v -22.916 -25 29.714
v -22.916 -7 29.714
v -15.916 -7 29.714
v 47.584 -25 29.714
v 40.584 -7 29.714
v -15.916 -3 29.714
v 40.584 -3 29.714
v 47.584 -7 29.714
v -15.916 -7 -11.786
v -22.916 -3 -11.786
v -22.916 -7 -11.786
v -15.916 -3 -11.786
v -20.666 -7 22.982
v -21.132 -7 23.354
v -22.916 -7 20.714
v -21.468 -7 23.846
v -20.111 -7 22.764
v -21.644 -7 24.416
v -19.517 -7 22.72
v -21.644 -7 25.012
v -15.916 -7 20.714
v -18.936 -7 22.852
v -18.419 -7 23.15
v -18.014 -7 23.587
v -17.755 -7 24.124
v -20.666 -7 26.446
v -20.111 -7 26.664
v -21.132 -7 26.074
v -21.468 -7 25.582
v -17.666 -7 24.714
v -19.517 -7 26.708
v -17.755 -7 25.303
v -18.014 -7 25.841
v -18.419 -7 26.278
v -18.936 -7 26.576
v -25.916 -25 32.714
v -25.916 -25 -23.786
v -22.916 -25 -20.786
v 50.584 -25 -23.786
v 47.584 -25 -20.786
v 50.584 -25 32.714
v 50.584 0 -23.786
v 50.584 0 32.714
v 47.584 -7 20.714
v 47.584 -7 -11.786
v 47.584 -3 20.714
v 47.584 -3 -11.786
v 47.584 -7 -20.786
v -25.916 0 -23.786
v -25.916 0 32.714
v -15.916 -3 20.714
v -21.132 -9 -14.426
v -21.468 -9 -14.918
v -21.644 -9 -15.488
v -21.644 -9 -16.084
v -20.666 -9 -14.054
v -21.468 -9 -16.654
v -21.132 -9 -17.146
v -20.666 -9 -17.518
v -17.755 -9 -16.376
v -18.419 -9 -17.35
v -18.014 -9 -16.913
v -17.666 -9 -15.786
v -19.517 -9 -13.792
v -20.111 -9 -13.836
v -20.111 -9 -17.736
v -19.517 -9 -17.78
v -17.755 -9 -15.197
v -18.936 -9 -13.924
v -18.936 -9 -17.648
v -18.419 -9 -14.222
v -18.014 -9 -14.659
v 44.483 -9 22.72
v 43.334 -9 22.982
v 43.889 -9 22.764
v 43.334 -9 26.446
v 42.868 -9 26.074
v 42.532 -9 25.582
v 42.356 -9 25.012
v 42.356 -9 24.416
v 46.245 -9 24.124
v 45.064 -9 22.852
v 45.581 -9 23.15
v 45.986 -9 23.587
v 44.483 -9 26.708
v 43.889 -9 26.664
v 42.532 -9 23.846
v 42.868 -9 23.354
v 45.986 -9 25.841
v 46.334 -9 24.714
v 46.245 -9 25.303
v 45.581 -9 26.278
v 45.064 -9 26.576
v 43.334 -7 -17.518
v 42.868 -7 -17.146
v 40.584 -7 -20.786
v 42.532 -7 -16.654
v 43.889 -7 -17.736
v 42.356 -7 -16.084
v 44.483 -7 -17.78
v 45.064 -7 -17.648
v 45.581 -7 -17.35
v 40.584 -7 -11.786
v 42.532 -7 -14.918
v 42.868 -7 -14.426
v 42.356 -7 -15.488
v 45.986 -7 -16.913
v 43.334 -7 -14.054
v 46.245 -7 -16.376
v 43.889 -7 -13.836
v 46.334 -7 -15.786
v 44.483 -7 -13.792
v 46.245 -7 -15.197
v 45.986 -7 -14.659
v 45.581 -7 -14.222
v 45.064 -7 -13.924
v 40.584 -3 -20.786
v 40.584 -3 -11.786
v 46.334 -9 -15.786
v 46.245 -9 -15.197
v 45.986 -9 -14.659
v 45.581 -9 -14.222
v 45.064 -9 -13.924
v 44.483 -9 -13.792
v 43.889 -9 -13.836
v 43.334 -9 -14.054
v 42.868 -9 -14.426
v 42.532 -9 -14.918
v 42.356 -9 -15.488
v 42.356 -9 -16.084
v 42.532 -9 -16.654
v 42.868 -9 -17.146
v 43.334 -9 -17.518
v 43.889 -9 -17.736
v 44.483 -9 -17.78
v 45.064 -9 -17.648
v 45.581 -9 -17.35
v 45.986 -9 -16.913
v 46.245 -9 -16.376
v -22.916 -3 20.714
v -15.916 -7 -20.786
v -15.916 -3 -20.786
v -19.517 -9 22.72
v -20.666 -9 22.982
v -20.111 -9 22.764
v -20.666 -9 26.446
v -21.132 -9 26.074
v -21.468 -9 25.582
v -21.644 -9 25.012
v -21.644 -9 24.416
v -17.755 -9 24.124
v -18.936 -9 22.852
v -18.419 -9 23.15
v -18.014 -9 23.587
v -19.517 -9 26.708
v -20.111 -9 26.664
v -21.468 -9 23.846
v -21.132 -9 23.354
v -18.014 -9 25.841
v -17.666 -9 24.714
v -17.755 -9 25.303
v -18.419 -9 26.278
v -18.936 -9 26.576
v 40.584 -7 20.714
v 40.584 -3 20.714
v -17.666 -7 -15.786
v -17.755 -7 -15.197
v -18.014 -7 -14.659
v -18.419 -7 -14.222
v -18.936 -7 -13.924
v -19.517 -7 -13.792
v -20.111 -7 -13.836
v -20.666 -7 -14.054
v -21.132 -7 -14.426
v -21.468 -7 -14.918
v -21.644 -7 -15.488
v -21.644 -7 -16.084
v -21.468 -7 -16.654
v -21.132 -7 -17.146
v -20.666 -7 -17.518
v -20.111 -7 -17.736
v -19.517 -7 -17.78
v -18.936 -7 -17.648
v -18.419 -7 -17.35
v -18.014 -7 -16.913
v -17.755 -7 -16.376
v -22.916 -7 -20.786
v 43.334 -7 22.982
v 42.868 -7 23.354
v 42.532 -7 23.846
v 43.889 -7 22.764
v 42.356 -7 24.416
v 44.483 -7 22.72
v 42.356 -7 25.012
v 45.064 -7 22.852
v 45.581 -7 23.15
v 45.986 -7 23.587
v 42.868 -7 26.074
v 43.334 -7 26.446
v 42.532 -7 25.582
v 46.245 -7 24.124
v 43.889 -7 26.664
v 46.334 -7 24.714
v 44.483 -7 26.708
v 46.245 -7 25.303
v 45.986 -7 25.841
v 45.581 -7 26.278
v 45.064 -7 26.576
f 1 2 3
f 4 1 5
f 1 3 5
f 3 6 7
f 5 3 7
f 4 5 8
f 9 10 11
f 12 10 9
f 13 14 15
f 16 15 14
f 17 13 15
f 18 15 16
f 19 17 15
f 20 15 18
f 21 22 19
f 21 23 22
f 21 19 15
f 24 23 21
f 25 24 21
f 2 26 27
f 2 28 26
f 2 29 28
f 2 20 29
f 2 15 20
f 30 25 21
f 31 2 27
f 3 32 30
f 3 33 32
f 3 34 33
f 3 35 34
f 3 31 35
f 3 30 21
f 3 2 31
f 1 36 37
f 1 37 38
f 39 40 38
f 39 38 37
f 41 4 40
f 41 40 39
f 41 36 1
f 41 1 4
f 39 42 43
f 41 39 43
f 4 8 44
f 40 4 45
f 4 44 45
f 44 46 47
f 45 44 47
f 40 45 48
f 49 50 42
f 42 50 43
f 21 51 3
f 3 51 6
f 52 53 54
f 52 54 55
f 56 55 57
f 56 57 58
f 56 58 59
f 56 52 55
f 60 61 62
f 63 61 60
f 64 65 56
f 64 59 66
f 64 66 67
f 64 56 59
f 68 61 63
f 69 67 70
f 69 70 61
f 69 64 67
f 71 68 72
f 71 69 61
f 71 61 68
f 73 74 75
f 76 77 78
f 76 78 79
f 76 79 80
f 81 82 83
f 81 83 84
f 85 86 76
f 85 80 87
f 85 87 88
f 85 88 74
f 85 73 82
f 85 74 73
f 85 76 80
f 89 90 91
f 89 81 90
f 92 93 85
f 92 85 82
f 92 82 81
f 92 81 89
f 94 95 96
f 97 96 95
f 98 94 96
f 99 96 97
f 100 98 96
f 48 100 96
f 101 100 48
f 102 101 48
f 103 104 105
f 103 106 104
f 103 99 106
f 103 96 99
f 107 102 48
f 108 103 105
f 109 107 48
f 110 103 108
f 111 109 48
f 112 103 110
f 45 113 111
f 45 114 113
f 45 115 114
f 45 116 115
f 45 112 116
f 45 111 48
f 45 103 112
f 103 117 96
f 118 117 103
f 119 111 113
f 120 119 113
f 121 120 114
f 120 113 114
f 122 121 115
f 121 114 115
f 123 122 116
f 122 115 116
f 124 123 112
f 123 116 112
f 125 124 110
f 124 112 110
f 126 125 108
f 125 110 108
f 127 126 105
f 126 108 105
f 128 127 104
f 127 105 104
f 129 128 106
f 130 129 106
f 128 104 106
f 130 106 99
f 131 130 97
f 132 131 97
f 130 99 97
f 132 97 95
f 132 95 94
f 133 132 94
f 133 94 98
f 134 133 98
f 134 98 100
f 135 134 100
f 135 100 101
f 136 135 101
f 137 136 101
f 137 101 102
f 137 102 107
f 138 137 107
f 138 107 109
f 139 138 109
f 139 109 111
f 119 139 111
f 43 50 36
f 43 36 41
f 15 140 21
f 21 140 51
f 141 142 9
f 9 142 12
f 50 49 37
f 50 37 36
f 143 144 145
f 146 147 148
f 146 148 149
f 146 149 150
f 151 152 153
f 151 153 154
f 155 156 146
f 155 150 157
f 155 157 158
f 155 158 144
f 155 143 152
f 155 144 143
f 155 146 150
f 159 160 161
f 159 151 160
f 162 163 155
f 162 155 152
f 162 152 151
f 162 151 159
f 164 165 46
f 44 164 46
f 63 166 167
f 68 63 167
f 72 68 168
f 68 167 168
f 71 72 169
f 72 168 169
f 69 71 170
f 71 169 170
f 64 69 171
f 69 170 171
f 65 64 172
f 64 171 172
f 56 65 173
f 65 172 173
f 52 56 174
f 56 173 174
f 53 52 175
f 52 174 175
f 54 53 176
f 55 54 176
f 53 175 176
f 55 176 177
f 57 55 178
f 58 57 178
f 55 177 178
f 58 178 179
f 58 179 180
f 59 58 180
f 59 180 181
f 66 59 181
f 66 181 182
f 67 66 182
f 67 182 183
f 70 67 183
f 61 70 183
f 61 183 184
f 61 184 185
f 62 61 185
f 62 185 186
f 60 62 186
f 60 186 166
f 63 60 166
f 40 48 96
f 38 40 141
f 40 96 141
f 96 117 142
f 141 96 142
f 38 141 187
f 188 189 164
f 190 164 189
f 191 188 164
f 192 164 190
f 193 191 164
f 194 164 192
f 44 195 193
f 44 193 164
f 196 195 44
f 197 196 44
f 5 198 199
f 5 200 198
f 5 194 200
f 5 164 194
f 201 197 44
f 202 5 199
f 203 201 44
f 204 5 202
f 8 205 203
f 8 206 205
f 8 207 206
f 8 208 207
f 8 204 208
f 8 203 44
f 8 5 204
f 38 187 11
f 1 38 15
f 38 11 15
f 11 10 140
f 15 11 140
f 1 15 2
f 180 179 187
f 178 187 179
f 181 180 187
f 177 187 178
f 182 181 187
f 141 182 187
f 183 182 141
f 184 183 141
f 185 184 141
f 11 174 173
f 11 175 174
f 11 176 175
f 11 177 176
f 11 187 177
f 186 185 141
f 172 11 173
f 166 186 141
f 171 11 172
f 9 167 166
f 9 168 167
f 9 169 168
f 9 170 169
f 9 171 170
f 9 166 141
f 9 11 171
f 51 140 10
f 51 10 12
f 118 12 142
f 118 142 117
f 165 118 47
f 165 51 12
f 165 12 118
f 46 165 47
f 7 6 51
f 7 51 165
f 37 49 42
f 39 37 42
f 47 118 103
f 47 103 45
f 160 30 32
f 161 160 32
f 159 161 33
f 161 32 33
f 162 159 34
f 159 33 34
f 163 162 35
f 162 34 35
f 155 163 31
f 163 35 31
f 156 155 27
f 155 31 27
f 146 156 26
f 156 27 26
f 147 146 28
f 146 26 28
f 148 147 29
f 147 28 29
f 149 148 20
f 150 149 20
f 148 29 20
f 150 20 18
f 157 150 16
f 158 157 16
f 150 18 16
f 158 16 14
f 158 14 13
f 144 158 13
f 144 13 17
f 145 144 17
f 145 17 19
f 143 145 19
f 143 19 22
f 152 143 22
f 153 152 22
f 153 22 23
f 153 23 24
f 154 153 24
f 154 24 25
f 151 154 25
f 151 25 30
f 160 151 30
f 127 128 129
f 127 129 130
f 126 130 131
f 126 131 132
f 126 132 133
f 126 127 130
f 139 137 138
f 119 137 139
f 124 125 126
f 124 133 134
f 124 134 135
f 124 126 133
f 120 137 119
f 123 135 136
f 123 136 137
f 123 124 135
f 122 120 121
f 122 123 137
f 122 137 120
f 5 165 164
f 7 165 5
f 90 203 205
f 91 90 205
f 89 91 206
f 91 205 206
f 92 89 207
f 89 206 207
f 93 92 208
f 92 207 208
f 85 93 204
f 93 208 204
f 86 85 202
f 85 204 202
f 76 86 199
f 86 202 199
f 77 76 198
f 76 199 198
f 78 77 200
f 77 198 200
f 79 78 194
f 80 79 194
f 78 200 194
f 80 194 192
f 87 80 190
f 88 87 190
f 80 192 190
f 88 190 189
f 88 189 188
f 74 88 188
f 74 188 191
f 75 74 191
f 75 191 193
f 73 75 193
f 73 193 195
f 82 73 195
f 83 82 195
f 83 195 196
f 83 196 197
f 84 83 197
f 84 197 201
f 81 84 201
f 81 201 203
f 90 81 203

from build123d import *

# Parameters (mm, degrees)
F0_W     = 76.5
F0_H     = 56.5
F1_DEPTH = 25
F2_DEPTH = 3
F0_W_2   = 7
F0_H_2   = 9
F0_R     = 2
F3_DEPTH = 7
F4_DEPTH = 9
F5_DEPTH = 9
F6_DEPTH = 9


with BuildPart() as f1:
    # F0 (on Front) → F1 (new body)
    with BuildSketch(Plane.XZ):
        with Locations((12.333626, 4.463955)):
            Rectangle(F0_W, F0_H)
        Polygon((-22.916374, 20.713955), (-22.916374, 29.713955), (-15.916374, 29.713955), (12.333626, 29.713955), (40.583626, 29.713955), (47.583626, 29.713955), (47.583626, 20.713955), (47.583626, 4.463955), (47.583626, -11.786045), (47.583626, -20.786045), (40.583626, -20.786045), (12.333626, -20.786045), (-15.916374, -20.786045), (-22.916374, -20.786045), (-22.916374, -11.786045), (-22.916374, 4.463955), align=None, mode=Mode.SUBTRACT)
    extrude(amount=F1_DEPTH)

    # F0 (on Front) → F2 (join)
    with BuildSketch(Plane.XZ):
        Polygon((12.333626, 29.713955), (-15.916374, 29.713955), (-15.916374, 20.713955), (-22.916374, 20.713955), (-22.916374, 4.463955), (12.333626, 4.463955), align=None)
        Polygon((40.583626, 29.713955), (12.333626, 29.713955), (12.333626, 4.463955), (47.583626, 4.463955), (47.583626, 20.713955), (40.583626, 20.713955), align=None)
        Polygon((47.583626, 4.463955), (12.333626, 4.463955), (12.333626, -20.786045), (40.583626, -20.786045), (40.583626, -11.786045), (47.583626, -11.786045), align=None)
        Polygon((12.333626, 4.463955), (-22.916374, 4.463955), (-22.916374, -11.786045), (-15.916374, -11.786045), (-15.916374, -20.786045), (12.333626, -20.786045), align=None)
    extrude(amount=F2_DEPTH)

    # F0 (on Front) → F3 (join)
    with BuildSketch(Plane.XZ):
        with Locations((-19.416374, 25.213955)):
            Rectangle(F0_W_2, F0_H_2)
        with Locations((-19.666374, 24.713955)):
            Circle(F0_R, mode=Mode.SUBTRACT)
        with Locations((44.083626, 25.213955)):
            Rectangle(F0_W_2, F0_H_2)
        with Locations((44.333626, 24.713955)):
            Circle(F0_R, mode=Mode.SUBTRACT)
        with Locations((44.083626, -16.286045)):
            Rectangle(F0_W_2, F0_H_2)
        with Locations((44.333626, -15.786045)):
            Circle(F0_R, mode=Mode.SUBTRACT)
        with Locations((-19.416374, -16.286045)):
            Rectangle(F0_W_2, F0_H_2)
        with Locations((-19.666374, -15.786045)):
            Circle(F0_R, mode=Mode.SUBTRACT)
    extrude(amount=F3_DEPTH)

    # F0 (on Front) → F4 (join)
    with BuildSketch(Plane.XZ):
        with Locations((-19.666374, 24.713955)):
            Circle(F0_R)
        with Locations((44.333626, -15.786045)):
            Circle(F0_R)
    extrude(amount=F4_DEPTH)

    # F0 (on Front) → F5 (join)
    with BuildSketch(Plane.XZ):
        with Locations((44.333626, 24.713955)):
            Circle(F0_R)
    extrude(amount=F5_DEPTH)

    # F0 (on Front) → F6 (join)
    with BuildSketch(Plane.XZ):
        with Locations((-19.666374, -15.786045)):
            Circle(F0_R)
    extrude(amount=F6_DEPTH)


solid = f1.part
